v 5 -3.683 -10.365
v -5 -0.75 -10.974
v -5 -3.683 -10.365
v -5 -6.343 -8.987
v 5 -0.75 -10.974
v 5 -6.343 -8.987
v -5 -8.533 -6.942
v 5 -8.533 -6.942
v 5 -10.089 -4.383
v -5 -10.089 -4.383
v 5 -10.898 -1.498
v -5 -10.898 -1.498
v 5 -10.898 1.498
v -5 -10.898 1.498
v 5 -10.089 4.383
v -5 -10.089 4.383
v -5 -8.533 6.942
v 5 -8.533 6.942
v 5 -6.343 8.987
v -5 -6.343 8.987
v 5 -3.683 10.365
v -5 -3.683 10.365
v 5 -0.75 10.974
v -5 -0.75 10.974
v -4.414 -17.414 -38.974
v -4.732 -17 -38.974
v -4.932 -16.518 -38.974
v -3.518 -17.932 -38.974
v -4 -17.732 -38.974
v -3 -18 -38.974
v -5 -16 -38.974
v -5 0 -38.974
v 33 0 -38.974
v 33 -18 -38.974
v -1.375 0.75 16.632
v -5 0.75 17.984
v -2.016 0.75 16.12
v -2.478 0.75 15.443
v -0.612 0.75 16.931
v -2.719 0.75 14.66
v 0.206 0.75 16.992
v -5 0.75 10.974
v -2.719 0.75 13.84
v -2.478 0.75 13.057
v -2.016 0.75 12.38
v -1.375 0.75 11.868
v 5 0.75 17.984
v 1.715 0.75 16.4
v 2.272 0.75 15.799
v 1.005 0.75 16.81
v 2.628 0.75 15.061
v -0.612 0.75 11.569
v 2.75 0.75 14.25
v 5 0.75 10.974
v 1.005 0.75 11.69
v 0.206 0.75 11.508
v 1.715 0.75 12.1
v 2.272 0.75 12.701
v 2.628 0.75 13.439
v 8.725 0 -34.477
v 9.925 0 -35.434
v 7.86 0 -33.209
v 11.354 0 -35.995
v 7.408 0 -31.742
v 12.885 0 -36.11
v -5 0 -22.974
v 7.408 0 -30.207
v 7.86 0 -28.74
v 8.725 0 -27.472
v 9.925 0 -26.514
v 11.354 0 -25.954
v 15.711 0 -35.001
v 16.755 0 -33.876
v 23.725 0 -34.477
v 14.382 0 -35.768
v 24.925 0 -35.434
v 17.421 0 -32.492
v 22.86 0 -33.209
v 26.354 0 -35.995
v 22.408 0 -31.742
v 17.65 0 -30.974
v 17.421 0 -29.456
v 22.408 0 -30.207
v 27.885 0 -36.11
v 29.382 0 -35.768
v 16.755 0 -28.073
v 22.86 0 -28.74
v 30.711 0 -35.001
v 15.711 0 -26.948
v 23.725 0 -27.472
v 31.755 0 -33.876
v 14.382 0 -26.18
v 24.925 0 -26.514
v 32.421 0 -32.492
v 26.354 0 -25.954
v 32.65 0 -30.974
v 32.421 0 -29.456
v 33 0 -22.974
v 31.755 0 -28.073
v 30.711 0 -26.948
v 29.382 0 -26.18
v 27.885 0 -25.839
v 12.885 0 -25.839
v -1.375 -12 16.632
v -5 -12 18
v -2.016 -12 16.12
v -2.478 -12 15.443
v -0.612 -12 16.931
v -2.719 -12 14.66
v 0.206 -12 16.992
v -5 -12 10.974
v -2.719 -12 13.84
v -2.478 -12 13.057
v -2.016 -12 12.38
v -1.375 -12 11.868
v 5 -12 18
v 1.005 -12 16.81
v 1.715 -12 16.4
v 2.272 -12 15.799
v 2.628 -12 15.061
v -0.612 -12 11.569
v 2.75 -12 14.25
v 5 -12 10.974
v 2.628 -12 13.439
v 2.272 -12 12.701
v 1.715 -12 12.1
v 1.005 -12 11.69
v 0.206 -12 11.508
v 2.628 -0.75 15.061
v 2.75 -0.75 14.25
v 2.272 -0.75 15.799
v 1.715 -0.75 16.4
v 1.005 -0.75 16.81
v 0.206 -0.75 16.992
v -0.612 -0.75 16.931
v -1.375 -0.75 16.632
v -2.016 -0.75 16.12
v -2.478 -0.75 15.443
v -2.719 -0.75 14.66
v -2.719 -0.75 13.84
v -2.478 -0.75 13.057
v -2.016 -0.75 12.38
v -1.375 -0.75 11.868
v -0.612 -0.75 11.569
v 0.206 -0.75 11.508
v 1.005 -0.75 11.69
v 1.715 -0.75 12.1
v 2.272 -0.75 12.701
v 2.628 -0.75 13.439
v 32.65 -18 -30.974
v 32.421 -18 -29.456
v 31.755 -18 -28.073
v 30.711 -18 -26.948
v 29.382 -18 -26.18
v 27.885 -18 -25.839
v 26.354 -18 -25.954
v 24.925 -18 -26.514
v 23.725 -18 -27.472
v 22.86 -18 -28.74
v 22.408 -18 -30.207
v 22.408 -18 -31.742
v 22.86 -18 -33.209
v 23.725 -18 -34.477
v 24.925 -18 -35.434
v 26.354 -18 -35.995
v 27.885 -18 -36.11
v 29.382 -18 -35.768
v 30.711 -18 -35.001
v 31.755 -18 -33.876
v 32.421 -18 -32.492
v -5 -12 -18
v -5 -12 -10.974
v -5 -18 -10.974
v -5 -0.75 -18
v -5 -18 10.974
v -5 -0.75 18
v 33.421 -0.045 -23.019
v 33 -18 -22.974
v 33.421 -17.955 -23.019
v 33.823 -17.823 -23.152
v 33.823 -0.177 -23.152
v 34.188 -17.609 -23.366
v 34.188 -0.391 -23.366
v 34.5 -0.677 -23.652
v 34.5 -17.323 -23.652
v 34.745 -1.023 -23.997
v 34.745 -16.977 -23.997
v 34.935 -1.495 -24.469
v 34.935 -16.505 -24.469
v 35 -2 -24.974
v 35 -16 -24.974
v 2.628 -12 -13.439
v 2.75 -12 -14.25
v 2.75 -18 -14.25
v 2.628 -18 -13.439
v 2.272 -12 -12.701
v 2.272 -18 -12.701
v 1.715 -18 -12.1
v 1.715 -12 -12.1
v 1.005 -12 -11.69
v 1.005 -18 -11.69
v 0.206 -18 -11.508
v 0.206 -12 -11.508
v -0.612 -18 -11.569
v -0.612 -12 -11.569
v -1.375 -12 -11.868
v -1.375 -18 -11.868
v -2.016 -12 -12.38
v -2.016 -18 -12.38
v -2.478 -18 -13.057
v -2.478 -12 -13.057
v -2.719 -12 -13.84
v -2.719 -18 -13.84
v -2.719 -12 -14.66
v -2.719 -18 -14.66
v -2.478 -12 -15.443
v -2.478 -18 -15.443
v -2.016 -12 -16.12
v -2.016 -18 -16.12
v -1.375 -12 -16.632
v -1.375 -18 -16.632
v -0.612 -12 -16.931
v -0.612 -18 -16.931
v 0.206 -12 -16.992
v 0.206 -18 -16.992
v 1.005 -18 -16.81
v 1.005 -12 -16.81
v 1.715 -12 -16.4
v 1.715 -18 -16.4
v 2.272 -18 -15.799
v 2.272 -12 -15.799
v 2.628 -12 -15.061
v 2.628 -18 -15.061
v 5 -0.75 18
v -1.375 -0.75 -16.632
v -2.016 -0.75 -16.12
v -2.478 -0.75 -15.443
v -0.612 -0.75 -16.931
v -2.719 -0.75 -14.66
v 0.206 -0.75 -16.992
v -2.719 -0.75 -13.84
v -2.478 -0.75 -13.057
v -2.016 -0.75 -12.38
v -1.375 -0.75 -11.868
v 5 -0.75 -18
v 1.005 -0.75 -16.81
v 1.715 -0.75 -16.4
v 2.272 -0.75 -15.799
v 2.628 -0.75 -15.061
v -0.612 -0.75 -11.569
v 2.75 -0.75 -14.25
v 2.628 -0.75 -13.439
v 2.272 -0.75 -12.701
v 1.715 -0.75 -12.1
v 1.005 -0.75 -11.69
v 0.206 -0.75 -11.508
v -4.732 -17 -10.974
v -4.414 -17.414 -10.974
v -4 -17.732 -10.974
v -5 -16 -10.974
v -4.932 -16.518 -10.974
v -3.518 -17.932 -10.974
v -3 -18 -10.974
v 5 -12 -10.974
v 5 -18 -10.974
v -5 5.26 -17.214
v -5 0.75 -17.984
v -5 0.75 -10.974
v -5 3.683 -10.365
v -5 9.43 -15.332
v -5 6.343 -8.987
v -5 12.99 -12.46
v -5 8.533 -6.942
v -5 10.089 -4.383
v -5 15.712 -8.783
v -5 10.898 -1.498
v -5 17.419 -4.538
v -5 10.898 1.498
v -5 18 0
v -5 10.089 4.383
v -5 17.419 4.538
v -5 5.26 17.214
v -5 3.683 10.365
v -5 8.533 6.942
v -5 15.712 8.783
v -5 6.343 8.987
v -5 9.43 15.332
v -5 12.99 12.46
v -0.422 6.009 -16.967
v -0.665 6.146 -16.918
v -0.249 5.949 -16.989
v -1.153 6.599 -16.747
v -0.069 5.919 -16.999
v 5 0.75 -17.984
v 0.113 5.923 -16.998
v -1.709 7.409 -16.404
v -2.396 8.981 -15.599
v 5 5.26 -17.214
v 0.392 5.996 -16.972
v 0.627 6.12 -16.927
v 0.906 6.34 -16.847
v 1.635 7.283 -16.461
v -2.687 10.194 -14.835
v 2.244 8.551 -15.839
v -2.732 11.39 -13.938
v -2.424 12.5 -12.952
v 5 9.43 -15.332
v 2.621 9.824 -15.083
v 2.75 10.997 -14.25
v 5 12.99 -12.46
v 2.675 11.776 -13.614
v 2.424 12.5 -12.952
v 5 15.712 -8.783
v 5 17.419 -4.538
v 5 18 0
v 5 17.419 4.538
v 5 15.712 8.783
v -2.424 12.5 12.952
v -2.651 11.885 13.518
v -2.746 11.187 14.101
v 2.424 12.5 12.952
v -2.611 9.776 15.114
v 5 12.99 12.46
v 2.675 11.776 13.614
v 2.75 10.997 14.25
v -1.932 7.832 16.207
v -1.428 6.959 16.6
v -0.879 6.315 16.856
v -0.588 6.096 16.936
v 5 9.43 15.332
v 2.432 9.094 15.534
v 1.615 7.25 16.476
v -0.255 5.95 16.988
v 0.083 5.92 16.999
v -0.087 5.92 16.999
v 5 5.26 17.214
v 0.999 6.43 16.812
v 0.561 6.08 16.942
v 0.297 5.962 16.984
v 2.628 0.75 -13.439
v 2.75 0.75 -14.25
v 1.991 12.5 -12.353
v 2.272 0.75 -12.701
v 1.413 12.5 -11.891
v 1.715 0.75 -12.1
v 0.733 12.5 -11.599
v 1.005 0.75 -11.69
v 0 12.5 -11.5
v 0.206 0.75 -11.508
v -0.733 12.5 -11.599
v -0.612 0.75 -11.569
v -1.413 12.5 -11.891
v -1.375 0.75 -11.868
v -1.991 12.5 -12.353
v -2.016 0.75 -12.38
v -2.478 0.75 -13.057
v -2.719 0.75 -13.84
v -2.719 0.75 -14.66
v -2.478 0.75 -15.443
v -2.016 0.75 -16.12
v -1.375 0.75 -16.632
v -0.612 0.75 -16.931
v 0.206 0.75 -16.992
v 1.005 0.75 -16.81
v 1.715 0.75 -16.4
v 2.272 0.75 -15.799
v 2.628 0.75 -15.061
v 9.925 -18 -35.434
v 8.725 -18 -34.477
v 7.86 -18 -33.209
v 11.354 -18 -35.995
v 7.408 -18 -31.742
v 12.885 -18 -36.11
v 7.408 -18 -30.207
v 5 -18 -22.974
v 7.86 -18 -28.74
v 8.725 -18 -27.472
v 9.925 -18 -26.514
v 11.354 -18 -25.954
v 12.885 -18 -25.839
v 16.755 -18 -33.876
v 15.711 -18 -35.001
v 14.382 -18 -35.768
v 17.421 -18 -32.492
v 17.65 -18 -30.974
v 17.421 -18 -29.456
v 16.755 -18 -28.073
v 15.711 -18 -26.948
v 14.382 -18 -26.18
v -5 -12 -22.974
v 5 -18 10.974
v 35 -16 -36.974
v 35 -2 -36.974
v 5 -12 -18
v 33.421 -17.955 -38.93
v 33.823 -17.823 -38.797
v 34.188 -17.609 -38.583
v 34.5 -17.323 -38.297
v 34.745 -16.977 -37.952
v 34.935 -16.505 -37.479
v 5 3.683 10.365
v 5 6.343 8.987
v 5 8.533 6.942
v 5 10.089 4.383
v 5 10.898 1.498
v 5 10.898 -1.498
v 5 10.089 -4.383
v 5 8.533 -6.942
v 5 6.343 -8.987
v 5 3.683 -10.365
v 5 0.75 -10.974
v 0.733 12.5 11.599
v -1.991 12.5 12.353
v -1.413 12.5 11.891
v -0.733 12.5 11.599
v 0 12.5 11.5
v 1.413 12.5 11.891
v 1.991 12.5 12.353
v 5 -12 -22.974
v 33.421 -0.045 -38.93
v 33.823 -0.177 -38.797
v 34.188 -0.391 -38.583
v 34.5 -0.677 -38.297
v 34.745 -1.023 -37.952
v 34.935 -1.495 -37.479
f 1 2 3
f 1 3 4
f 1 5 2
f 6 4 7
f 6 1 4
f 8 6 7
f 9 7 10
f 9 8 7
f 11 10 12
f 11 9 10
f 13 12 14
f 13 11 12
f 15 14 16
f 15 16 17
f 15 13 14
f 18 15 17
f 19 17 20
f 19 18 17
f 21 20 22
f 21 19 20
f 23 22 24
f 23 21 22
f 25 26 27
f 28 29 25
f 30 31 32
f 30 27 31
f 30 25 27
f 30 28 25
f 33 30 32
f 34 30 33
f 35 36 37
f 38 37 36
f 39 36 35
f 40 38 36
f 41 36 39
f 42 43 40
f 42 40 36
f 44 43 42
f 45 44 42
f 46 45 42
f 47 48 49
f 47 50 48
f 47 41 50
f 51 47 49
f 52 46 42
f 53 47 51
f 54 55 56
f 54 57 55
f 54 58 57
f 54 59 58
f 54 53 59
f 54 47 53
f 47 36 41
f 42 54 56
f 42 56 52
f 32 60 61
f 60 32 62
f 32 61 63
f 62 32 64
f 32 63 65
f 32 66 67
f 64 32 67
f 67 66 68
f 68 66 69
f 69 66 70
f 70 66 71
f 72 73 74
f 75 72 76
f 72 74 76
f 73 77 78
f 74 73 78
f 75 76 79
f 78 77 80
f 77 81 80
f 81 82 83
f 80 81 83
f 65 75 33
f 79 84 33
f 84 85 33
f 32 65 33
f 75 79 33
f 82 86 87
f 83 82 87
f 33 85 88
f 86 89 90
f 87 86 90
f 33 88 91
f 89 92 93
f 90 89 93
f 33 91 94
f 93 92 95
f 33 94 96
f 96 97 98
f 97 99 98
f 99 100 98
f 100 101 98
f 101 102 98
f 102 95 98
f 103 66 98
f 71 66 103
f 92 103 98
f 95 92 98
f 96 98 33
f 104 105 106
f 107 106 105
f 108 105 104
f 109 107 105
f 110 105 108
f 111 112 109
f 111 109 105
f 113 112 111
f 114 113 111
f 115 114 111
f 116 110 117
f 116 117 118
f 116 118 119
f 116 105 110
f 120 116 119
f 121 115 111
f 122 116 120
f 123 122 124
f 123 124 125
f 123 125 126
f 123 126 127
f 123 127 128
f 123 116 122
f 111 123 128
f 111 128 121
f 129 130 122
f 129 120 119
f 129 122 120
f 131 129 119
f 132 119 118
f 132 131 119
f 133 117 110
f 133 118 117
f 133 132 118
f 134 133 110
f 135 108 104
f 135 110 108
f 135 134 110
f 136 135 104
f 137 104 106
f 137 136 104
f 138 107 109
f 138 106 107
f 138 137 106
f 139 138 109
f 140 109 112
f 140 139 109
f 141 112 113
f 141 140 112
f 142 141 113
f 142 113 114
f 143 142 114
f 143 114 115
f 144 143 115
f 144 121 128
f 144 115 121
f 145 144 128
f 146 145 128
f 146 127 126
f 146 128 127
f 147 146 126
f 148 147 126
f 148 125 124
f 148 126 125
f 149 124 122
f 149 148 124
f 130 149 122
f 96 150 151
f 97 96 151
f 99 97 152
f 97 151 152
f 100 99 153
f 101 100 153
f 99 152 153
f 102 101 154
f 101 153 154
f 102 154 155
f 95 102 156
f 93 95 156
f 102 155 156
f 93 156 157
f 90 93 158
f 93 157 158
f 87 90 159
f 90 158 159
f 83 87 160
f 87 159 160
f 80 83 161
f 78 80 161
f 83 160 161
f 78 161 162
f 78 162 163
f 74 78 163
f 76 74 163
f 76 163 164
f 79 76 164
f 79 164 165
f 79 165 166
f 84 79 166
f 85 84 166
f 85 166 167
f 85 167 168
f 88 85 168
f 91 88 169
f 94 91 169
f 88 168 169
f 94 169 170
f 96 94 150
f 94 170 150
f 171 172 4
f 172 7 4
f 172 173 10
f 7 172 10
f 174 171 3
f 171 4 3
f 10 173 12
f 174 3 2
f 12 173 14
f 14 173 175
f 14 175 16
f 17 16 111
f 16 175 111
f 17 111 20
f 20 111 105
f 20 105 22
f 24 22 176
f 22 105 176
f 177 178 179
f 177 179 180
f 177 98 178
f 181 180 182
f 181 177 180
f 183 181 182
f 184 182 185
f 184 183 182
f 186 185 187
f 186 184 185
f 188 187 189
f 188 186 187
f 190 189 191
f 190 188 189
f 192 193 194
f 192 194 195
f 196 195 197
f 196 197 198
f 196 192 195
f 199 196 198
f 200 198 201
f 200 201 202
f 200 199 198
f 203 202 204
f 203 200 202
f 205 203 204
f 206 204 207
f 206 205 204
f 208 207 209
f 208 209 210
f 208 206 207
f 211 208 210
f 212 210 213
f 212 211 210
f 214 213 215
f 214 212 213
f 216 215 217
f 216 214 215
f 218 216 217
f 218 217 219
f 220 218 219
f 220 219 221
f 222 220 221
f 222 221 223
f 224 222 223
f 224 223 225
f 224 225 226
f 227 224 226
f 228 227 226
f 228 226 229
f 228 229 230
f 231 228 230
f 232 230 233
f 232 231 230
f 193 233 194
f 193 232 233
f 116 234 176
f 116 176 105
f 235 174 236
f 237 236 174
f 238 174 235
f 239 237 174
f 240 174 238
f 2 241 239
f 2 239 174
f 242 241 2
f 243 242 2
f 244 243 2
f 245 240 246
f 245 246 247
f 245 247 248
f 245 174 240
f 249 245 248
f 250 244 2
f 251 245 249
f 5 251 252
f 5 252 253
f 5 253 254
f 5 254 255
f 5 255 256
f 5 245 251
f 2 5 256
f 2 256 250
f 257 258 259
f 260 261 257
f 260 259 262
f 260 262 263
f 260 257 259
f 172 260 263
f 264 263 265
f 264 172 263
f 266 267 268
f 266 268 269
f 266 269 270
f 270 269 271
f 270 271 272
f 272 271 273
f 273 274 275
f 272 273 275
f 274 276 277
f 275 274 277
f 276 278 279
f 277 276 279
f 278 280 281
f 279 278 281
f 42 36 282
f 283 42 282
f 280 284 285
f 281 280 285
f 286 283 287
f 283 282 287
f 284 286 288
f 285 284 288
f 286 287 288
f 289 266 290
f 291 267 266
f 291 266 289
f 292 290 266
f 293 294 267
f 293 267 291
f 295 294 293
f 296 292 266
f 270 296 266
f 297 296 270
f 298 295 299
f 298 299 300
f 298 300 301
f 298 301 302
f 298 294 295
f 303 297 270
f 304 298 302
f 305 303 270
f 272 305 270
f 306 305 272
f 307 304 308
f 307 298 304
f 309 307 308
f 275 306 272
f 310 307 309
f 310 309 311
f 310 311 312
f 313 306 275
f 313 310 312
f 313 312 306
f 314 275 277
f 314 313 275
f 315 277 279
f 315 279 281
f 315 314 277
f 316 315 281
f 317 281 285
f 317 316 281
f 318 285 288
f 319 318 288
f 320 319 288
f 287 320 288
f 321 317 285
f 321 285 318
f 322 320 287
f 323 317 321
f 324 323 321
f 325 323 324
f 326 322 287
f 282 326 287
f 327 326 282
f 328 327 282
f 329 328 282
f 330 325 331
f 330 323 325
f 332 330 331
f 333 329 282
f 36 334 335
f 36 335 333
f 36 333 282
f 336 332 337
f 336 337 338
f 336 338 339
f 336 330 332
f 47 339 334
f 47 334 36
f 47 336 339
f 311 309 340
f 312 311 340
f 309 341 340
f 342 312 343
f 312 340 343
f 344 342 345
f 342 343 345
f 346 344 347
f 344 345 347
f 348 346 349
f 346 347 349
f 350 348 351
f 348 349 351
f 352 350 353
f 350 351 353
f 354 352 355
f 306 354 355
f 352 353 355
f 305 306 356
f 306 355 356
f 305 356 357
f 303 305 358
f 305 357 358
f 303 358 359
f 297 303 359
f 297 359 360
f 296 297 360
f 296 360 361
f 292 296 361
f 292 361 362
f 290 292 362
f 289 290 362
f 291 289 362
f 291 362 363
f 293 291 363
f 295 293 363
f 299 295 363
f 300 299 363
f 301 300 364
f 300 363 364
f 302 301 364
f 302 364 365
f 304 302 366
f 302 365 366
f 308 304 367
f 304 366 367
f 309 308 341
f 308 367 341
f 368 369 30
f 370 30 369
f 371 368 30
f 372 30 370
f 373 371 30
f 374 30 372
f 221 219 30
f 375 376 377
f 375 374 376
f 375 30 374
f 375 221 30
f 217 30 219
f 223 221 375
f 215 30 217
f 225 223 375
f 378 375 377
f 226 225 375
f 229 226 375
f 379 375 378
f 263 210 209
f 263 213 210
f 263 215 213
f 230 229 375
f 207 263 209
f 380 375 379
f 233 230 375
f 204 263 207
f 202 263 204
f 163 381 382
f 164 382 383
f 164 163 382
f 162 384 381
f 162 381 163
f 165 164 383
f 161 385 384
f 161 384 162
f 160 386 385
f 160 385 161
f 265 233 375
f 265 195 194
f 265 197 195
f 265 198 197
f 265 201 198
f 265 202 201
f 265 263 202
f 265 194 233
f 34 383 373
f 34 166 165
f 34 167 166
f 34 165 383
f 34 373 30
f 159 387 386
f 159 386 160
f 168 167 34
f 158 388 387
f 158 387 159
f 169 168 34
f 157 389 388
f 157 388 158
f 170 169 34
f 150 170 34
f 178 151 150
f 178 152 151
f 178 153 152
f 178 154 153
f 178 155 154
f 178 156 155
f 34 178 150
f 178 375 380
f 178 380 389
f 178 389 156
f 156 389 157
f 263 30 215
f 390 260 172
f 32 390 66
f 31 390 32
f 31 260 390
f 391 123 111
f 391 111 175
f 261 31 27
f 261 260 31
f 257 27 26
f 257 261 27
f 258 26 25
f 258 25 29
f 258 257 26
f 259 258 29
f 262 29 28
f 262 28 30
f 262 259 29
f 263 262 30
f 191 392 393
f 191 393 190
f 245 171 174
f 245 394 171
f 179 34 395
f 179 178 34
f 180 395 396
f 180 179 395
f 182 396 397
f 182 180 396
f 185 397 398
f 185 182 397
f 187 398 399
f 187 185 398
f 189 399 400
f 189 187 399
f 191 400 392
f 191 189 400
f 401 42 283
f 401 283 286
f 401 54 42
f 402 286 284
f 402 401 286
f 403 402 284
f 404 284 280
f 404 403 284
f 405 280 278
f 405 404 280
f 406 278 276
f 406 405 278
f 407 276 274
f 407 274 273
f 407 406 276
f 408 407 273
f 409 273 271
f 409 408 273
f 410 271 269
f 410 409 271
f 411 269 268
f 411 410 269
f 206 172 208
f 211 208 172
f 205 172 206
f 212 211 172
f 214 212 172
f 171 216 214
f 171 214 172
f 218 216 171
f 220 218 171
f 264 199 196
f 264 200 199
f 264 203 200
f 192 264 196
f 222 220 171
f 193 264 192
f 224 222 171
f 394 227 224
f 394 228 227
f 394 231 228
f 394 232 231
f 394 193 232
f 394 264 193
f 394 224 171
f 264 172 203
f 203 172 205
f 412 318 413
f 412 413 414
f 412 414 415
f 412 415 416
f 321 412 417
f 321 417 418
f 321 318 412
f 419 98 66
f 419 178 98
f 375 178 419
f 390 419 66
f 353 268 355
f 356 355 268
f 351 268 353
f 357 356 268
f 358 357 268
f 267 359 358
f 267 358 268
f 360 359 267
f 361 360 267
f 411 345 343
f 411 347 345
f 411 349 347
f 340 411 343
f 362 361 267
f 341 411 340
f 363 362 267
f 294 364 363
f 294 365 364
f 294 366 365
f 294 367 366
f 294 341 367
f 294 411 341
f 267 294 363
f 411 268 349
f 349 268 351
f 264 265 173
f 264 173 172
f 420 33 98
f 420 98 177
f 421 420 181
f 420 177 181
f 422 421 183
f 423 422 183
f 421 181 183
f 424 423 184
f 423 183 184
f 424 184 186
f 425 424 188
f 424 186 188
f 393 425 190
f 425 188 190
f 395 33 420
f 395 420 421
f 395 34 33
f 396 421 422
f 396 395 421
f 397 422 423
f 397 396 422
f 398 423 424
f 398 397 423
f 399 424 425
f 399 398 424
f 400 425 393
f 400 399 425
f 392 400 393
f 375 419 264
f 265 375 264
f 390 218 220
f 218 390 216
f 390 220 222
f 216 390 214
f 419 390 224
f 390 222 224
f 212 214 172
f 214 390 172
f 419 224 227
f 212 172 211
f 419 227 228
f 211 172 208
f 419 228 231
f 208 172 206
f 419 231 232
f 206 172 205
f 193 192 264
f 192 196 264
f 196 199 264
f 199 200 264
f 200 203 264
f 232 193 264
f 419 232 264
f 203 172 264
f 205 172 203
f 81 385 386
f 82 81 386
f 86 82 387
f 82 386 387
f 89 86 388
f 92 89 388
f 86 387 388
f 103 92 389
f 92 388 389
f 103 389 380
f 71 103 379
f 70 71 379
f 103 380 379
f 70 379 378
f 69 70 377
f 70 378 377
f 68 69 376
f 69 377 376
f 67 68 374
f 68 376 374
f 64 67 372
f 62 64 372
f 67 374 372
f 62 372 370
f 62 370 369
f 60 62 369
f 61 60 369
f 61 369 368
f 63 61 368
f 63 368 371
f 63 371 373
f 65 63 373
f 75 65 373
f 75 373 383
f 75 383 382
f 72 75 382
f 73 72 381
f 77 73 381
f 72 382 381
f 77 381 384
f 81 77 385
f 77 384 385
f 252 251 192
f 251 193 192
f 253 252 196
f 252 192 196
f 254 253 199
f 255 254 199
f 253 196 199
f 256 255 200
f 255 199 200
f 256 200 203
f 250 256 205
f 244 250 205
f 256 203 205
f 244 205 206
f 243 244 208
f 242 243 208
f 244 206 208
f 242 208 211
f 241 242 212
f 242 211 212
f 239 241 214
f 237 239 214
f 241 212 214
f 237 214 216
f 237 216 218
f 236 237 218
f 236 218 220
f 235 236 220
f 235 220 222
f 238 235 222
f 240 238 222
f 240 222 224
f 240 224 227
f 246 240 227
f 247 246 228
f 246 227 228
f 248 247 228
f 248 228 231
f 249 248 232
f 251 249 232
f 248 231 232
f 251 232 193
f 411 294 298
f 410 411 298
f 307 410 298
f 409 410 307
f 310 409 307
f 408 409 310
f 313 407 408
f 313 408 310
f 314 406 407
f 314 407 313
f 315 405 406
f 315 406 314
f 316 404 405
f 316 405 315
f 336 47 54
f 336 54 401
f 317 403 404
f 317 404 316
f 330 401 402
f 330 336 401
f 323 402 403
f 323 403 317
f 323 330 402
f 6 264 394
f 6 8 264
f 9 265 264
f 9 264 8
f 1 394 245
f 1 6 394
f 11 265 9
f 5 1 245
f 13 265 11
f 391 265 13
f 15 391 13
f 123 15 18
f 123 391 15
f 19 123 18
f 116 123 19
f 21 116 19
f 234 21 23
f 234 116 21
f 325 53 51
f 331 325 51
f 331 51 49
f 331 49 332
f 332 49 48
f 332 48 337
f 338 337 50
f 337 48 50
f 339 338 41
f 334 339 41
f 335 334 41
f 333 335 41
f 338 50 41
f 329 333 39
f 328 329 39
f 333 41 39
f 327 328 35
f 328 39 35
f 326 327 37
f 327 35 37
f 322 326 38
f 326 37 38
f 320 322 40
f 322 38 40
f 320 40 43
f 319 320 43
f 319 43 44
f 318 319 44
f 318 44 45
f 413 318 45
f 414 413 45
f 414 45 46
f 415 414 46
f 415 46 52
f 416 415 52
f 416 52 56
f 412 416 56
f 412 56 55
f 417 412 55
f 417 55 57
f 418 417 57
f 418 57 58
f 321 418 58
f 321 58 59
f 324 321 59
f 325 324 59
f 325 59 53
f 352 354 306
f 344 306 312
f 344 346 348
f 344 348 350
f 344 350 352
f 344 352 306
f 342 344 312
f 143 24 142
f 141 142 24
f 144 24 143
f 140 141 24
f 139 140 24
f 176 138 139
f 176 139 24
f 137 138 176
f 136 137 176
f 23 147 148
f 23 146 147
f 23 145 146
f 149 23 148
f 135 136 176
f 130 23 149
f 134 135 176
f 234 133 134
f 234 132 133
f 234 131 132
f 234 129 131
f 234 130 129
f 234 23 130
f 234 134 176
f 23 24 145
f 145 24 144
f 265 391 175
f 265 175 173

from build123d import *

# Parameters (mm, degrees)
F1_DEPTH      = 5
F2_R          = 2.75
F3_DEPTH      = 12.5
F4_W          = 10
F4_H          = 4.9744020338
F4_H_2        = 7.0255979662
F4_R          = 2.75
F5_DEPTH      = 6
F6_DEPTH      = 6
F6_DEPTH_BACK = 12
F7_R          = 5.15
F8_DEPTH      = 18
F9_DEPTH      = 18
F11_R         = 2


# Not quite as in the source:
# - the program builds the solid bodies; features that only make, move or delete a surface that nothing else refers to are left out


with BuildPart() as f1:
    # F0 (on Right) → F1 (new body, symmetric)
    with BuildSketch(Plane.YZ):
        with BuildLine():
            ThreePointArc((-0.75, -10.9744020338), (-11, 0), (-0.75, 10.9744020338))
            Line((-0.75, 10.9744020338), (-0.75, 18))
            Line((-0.75, 18), (-12, 18))
            Line((-12, 18), (-12, 10.9744020338))
            Line((-12, 10.9744020338), (-18, 10.9744020338))
            Line((-18, 10.9744020338), (-18, -10.9744020338))
            Line((-18, -10.9744020338), (-12, -10.9744020338))
            Line((-12, -10.9744020338), (-12, -18))
            Line((-12, -18), (-0.75, -18))
            Line((-0.75, -18), (-0.75, -10.9744020338))
        make_face()
    extrude(amount=F1_DEPTH, both=True)


with BuildPart() as f1b:
    # F0 (on Right) → F1, piece 2 (new body, symmetric)
    with BuildSketch(Plane.YZ):
        with BuildLine():
            Line((0.75, -10.9744020338), (0.75, -17.9843682124))
            ThreePointArc((0.75, -17.9843682124), (18, 0), (0.75, 17.9843682124))
            Line((0.75, 17.9843682124), (0.75, 10.9744020338))
            ThreePointArc((0.75, 10.9744020338), (11, 0), (0.75, -10.9744020338))
        make_face()
    extrude(amount=F1_DEPTH, both=True)


with BuildPart() as f3_tool:
    # F2 (on Front) → F3 (new body, symmetric)
    with BuildSketch(Plane.XZ):
        with Locations((0, 14.25)):
            Circle(F2_R)
        with Locations((0, -14.25)):
            Circle(F2_R)
    extrude(amount=F3_DEPTH, both=True)


with BuildPart() as f1_1:
    add(f1.part)

    # F3: cut by f3_tool
    add(f3_tool.part, mode=Mode.SUBTRACT)


with BuildPart() as f1b_1:
    add(f1b.part)

    # F3: cut by f3_tool
    add(f3_tool.part, mode=Mode.SUBTRACT)


with BuildPart() as f5:
    # F4 (on face) → F5 (new body, through all)
    with BuildSketch(Plane.XZ.offset(12)):
        with Locations((0, -20.4872010169)):
            Rectangle(F4_W, F4_H)
        with Locations((0, -14.4872010169)):
            Rectangle(F4_W, F4_H_2)
        with Locations((0, -14.25)):
            Circle(F4_R, mode=Mode.SUBTRACT)
    extrude(amount=F5_DEPTH)

    # F4 (on face) → F6 (join, two sides)
    with BuildSketch(Plane.XZ.offset(12)) as f6_sk:
        Polygon((5, -22.9744020338), (-5, -22.9744020338), (-5, -38.9744020338), (35, -38.9744020338), (35, -22.9744020338), align=None)
    extrude(amount=F6_DEPTH)
    extrude(f6_sk.sketch, amount=-F6_DEPTH_BACK)

    # F7 (on face) → F8 (cut, through all)
    with BuildSketch(Plane.XZ.offset(18)):
        with Locations((12.5, -30.9744020338)):
            Circle(F7_R)
    extrude(amount=-F8_DEPTH, mode=Mode.SUBTRACT)

    # F7 (on face) → F9 (cut, through all)
    with BuildSketch(Plane.XZ.offset(18)):
        with Locations((27.5, -30.9744020338)):
            Circle(F7_R)
    extrude(amount=-F9_DEPTH, mode=Mode.SUBTRACT)

    # F11
    f11_edges = [f5.edges().sort_by_distance(p)[0] for p in [
        (35, -18, -30.974402),
        (35, 0, -30.974402),
        (35, -9, -38.974402),
        (35, -9, -22.974402),
        (-5, -18, -24.974402),
    ]]
    fillet(f11_edges, radius=F11_R)


solid = Compound([f1_1.part, f1b_1.part, f5.part])
